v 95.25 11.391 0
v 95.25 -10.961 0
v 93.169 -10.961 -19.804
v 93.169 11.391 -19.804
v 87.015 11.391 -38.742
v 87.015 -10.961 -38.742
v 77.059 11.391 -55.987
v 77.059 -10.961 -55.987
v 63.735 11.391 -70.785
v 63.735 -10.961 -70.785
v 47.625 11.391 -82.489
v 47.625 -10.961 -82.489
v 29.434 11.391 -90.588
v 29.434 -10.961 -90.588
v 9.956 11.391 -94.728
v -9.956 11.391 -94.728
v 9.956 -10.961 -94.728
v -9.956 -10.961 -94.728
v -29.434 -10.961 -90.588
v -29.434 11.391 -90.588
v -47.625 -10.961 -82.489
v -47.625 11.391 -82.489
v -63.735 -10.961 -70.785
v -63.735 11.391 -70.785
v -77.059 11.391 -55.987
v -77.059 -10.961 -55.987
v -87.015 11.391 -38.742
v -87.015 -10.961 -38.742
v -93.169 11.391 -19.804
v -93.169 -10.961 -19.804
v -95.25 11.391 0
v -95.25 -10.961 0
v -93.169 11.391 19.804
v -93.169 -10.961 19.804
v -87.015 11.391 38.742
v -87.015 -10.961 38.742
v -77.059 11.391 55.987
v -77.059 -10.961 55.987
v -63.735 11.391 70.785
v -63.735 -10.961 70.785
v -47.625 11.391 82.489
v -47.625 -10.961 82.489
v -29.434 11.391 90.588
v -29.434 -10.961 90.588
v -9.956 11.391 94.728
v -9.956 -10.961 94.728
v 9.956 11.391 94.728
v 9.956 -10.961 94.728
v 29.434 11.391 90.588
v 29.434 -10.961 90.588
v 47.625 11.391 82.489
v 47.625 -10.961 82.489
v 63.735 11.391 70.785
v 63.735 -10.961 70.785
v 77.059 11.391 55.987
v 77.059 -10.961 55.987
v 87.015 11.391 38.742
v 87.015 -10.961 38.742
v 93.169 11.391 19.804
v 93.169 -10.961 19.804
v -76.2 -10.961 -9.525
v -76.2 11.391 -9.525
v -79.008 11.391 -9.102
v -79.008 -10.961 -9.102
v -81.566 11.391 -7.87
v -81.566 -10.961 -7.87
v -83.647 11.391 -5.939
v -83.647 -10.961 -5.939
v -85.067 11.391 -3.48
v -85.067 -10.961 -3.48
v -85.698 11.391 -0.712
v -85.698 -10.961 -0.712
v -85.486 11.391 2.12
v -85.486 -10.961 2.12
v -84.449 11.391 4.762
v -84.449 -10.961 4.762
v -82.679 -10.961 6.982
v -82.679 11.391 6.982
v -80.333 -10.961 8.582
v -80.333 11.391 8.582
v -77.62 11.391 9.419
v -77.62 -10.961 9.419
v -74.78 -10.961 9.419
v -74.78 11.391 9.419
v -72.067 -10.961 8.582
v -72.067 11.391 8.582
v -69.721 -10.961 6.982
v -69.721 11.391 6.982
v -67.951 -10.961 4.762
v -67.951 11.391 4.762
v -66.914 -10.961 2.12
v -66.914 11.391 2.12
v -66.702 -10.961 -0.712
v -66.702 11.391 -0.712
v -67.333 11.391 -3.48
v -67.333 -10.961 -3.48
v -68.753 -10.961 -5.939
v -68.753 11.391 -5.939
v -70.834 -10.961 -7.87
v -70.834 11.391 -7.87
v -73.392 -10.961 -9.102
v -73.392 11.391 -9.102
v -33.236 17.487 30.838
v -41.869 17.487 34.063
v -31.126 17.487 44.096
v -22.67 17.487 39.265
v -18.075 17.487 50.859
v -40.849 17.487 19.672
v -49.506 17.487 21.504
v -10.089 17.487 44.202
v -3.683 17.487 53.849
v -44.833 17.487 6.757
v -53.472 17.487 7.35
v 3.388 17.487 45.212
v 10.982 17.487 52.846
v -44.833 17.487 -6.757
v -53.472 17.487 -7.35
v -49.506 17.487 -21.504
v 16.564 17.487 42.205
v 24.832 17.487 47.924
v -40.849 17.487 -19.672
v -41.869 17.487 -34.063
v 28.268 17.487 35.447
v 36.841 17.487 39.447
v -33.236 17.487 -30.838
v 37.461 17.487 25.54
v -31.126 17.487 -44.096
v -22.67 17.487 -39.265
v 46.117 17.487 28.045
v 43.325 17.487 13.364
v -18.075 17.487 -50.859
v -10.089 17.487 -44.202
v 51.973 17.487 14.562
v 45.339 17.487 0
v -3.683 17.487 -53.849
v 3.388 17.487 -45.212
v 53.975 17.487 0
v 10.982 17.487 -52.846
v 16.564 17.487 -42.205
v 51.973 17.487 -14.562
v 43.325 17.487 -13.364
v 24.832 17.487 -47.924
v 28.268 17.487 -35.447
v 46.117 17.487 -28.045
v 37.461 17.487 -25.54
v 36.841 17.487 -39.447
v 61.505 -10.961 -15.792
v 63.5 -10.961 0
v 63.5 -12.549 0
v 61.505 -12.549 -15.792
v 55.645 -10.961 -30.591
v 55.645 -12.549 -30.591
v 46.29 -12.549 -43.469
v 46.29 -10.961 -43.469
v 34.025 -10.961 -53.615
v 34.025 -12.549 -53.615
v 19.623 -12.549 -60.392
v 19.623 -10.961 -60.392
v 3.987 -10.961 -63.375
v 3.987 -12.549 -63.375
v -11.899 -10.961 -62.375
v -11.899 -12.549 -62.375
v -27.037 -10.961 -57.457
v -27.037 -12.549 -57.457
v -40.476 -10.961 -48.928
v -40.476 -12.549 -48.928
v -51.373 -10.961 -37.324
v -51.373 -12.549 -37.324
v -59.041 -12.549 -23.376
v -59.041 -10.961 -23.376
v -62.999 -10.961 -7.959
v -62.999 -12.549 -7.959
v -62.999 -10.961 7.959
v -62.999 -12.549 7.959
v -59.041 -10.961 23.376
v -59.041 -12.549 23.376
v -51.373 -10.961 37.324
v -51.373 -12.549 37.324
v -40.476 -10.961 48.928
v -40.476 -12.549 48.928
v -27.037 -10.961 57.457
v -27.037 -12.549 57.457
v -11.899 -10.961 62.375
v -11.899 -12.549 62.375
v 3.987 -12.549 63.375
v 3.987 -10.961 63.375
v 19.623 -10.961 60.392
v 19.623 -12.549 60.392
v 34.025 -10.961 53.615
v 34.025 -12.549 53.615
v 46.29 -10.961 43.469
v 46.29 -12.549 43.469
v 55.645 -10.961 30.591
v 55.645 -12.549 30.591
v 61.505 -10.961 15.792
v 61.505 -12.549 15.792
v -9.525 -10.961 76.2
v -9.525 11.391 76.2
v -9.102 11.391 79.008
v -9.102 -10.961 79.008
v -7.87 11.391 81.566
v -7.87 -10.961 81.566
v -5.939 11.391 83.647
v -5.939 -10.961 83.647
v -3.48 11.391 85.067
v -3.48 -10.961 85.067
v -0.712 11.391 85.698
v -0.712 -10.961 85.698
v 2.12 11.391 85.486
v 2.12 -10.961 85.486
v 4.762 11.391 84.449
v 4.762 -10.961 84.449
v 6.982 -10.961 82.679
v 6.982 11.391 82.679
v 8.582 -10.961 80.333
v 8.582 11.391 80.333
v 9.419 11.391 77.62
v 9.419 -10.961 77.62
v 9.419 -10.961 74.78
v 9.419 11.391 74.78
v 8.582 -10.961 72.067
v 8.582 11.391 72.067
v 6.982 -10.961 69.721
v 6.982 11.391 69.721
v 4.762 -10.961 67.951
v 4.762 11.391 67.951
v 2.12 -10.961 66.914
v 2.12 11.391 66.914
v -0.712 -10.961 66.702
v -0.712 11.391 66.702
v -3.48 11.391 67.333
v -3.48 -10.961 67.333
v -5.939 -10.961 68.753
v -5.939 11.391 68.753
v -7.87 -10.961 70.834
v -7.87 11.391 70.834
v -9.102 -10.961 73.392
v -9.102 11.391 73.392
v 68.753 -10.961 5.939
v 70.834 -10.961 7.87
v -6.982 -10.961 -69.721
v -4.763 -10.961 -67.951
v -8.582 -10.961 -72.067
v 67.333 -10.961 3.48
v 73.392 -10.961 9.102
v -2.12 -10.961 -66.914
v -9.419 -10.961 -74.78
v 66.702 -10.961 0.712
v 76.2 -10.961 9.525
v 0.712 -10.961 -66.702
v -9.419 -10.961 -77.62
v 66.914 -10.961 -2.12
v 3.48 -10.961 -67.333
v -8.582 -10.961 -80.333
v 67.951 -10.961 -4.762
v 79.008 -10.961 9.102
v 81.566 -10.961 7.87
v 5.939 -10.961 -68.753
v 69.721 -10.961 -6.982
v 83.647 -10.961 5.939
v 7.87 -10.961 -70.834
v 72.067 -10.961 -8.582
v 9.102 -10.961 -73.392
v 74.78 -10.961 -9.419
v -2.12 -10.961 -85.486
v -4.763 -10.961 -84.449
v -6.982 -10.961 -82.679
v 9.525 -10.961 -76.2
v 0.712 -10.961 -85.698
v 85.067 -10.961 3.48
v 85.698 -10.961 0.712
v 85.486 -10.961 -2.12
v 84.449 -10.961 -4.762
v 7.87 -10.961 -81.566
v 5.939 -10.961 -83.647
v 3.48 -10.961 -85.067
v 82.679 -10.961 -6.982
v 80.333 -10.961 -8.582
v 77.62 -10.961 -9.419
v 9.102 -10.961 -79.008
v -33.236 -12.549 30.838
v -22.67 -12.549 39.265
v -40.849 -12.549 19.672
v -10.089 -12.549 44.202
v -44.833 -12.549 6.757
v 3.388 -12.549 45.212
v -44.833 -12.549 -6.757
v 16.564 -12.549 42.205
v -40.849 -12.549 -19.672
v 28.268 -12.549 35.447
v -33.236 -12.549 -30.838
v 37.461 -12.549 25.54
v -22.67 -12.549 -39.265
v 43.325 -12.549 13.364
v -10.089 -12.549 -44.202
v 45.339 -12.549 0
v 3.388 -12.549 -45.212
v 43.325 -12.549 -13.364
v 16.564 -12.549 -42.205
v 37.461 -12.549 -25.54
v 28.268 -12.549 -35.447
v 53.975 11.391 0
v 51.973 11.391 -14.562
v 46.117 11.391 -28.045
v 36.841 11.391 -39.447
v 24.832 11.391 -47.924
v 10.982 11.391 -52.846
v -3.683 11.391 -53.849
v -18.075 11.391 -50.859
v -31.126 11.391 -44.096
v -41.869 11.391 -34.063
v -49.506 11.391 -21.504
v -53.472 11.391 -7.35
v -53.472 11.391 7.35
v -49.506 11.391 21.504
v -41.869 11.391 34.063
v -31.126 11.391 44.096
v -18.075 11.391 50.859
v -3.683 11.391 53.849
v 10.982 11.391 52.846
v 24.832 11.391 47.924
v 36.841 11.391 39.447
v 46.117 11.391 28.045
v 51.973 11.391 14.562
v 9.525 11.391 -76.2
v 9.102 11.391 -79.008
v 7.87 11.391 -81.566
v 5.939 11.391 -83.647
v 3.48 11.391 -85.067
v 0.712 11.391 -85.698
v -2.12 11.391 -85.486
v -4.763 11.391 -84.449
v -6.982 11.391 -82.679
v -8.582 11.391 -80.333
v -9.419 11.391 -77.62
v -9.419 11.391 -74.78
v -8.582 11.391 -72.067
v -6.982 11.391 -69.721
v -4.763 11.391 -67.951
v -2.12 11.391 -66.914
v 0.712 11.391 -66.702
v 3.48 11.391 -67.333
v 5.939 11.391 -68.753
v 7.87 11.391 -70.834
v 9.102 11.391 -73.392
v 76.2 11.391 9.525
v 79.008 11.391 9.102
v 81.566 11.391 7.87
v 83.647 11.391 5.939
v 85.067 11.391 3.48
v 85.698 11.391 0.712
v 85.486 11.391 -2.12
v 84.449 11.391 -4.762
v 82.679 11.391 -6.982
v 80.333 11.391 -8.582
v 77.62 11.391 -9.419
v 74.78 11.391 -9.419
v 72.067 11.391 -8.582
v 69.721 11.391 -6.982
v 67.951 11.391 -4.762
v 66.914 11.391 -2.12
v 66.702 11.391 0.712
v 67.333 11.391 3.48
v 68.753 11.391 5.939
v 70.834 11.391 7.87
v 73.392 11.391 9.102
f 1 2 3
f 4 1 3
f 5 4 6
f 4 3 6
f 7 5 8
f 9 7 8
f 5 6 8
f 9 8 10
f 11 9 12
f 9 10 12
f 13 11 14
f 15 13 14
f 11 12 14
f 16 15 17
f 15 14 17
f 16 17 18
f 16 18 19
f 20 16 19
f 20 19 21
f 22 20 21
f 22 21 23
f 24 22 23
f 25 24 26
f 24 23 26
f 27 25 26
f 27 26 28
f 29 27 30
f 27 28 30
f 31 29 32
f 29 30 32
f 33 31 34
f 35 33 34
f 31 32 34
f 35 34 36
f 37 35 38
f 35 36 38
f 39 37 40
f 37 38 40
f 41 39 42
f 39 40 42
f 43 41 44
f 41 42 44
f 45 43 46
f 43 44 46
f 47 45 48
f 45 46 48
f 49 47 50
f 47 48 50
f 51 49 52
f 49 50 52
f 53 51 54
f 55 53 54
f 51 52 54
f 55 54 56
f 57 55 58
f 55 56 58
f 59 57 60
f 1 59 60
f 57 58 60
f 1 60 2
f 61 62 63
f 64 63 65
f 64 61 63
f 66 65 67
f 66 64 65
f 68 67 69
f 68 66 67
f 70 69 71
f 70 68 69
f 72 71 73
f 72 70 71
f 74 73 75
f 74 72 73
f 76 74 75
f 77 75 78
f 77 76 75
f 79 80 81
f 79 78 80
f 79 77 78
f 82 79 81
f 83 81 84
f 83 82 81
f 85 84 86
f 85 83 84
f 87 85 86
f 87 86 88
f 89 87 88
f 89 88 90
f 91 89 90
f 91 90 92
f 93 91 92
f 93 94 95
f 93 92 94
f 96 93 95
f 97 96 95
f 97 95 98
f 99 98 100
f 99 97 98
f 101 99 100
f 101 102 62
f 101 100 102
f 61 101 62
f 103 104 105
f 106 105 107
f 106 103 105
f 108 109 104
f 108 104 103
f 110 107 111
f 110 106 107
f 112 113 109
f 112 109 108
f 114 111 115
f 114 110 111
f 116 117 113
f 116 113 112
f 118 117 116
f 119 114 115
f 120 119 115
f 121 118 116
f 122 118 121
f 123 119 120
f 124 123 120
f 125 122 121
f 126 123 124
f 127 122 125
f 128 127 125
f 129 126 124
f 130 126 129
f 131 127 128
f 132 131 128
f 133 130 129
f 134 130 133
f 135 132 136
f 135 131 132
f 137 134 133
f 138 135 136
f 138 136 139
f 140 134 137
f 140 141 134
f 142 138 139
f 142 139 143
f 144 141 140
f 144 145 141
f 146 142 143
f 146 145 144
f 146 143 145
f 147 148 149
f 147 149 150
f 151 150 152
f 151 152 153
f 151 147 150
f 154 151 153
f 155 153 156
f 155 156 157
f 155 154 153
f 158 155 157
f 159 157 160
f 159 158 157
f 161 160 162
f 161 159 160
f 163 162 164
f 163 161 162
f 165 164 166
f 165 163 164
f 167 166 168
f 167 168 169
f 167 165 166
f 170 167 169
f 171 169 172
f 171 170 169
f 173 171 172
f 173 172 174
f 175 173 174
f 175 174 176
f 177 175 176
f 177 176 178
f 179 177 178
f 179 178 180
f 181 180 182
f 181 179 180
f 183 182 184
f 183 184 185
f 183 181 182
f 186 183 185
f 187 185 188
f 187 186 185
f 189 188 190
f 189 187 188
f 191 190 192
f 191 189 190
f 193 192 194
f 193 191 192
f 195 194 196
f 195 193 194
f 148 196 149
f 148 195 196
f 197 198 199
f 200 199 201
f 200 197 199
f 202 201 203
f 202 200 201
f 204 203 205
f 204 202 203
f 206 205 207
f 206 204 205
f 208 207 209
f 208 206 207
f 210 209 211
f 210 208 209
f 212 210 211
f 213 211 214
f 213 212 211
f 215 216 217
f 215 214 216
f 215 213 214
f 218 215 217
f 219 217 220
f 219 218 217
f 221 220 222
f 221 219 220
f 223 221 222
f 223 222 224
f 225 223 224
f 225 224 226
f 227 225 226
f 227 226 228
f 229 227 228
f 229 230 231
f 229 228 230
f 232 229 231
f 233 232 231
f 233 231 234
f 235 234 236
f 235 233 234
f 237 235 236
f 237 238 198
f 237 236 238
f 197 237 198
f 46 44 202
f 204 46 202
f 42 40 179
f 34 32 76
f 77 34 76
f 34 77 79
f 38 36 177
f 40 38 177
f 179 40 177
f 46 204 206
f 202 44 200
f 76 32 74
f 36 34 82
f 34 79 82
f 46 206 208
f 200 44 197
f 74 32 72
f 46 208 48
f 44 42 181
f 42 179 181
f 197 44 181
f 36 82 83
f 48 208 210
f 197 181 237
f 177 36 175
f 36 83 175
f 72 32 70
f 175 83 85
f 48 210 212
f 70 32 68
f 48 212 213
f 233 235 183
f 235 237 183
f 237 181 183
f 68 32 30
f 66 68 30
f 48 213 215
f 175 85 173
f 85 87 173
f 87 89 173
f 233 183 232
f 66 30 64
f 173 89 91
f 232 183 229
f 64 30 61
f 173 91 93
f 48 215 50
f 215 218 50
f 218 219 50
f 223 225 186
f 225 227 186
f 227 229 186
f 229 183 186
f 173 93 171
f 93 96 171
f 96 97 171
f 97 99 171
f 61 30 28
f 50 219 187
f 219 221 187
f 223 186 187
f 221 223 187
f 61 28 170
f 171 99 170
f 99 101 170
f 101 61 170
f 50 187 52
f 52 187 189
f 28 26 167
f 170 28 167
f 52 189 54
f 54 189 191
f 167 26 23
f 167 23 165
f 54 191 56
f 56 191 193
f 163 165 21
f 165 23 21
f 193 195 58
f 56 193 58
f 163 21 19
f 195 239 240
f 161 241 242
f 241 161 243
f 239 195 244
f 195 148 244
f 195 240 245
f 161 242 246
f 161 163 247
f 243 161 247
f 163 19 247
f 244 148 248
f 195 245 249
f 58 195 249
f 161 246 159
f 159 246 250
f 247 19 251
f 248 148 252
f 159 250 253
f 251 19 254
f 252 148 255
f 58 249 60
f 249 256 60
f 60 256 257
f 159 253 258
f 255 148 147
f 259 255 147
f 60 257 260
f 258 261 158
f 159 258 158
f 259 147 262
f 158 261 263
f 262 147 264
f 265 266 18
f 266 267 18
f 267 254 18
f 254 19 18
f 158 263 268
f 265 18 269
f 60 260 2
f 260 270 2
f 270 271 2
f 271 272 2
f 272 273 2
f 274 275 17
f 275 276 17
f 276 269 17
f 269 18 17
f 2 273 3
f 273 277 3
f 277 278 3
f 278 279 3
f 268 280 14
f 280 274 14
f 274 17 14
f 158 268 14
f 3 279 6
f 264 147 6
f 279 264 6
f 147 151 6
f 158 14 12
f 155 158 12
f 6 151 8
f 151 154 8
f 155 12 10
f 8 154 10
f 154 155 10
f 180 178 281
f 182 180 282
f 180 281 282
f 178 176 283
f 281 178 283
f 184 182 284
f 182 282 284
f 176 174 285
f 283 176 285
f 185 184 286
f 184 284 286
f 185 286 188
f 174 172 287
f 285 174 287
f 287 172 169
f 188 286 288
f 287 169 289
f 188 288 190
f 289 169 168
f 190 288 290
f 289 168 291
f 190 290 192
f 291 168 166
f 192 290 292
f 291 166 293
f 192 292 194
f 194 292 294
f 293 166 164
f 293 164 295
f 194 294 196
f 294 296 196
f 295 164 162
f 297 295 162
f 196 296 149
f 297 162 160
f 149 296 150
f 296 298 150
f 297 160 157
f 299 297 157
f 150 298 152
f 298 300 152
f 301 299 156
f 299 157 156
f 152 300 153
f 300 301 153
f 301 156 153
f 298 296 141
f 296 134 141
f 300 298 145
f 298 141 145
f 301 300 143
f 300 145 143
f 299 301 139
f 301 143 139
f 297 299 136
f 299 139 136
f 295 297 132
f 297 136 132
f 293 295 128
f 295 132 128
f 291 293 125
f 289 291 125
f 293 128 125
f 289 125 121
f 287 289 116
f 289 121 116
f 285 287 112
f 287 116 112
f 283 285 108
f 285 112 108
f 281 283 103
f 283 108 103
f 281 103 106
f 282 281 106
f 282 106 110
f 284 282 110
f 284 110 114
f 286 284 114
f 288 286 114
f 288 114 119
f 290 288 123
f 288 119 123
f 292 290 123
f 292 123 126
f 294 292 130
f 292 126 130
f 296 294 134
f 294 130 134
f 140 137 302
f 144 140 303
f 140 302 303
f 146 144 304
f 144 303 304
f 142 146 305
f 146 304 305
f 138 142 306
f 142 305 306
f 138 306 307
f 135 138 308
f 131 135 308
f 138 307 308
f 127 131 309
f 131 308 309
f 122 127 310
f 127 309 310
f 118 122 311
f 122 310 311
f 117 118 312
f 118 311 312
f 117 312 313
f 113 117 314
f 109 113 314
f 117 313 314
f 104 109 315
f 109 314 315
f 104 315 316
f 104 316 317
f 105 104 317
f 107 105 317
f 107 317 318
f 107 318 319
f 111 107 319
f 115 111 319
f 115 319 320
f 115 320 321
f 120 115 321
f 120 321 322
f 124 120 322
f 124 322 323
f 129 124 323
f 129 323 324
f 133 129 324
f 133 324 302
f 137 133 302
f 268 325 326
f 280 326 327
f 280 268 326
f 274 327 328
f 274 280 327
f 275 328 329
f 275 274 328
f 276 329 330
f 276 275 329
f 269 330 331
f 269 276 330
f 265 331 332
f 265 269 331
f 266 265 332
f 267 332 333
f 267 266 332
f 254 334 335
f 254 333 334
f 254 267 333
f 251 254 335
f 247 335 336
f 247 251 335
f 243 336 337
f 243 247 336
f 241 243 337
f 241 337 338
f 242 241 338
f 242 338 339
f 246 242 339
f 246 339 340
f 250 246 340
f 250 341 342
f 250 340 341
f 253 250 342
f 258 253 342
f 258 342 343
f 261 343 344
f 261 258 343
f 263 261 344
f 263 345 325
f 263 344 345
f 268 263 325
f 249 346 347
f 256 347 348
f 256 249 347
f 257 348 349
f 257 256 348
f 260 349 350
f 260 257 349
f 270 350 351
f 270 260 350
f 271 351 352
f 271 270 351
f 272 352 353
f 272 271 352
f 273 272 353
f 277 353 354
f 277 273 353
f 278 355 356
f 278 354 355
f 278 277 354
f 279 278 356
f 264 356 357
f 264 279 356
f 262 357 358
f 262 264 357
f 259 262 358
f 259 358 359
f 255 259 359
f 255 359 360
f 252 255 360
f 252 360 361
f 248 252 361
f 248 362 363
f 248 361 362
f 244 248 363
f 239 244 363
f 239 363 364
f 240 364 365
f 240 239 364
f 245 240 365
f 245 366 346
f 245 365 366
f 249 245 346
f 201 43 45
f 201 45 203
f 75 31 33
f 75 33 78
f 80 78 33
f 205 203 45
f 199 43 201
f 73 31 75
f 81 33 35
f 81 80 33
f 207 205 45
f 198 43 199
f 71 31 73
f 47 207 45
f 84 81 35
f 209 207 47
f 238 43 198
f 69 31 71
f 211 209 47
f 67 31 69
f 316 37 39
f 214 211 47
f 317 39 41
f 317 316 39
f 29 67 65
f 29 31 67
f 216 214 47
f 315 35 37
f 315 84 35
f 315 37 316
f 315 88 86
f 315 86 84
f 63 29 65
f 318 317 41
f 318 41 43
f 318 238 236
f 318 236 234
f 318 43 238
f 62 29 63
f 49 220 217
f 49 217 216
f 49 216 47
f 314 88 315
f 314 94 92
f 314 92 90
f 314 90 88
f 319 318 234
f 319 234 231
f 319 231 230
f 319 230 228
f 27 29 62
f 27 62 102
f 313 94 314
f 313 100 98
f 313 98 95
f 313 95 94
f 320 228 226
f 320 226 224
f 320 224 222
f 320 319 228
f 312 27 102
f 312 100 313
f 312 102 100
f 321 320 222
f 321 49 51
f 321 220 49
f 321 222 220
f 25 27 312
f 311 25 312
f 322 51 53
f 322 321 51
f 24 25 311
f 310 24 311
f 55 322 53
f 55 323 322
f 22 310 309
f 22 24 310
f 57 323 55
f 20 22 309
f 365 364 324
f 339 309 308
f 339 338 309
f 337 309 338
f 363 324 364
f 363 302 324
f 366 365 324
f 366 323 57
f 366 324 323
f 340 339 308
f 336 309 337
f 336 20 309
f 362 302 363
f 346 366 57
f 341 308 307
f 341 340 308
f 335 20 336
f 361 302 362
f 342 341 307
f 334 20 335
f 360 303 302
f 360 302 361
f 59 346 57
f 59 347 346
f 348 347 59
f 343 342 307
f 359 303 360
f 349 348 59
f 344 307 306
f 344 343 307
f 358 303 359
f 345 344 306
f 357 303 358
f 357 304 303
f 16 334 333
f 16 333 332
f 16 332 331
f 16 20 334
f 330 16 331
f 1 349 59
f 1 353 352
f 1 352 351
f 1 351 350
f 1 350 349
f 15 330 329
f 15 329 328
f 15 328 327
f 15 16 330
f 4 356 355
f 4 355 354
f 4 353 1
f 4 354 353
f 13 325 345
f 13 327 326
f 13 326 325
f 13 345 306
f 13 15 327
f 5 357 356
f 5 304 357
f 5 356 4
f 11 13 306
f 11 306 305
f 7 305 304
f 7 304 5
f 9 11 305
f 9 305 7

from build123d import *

# Parameters (mm, degrees)
SKETCH1_R               = 3.75
BOSS_EXTRUDE1_DEPTH     = 0.88
SKETCH2_R               = 2.125
BOSS_EXTRUDE2_DEPTH     = 1.12
SKETCH3_R               = 2.5
BOSS_EXTRUDE3_DEPTH     = 0.0625
SKETCH4_R               = 1.785
CUT_EXTRUDE1_DEPTH      = 3
CUT_EXTRUDE1_DEPTH_BACK = 1.0625
SKETCH7_R               = 0.375
CUT_EXTRUDE2_DEPTH      = 3.0625
CIRPATTERN1_COUNT       = 4
SCALE1_SCALE            = 25.4


with BuildPart() as part:
    # Sketch1 → Boss-Extrude1 (new body)
    with BuildSketch(Plane(origin=(0, 0, 0), x_dir=(1, 0, 0), z_dir=(0, 1, 0))):
        Circle(SKETCH1_R)
    extrude(amount=BOSS_EXTRUDE1_DEPTH)

    # Sketch2 → Boss-Extrude2 (add)
    with BuildSketch(Plane(origin=(0, 0, 0), x_dir=(1, 0, 0), z_dir=(0, 1, 0))):
        Circle(SKETCH2_R)
    extrude(amount=BOSS_EXTRUDE2_DEPTH)

    # Sketch3 → Boss-Extrude3 (add)
    with BuildSketch(Plane(origin=(0, 0, 0), x_dir=(1, 0, 0), z_dir=(0, 1, 0))):
        Circle(SKETCH3_R)
    extrude(amount=-BOSS_EXTRUDE3_DEPTH)

    # Sketch4 → Cut-Extrude1 (cut, two sides)
    with BuildSketch(Plane(origin=(0, 0, 0), x_dir=(1, 0, 0), z_dir=(0, 1, 0))) as cut_extrude1_sk:
        Circle(SKETCH4_R)
    extrude(amount=CUT_EXTRUDE1_DEPTH, mode=Mode.SUBTRACT)
    extrude(cut_extrude1_sk.sketch, amount=-CUT_EXTRUDE1_DEPTH_BACK, mode=Mode.SUBTRACT)

    # Sketch7 → Cut-Extrude2 (cut)
    with BuildSketch(Plane(origin=(0, 0, 0), x_dir=(1, 0, 0), z_dir=(0, 1, 0))):
        with Locations((0, 3)):
            Circle(SKETCH7_R)
    cut_extrude2 = extrude(amount=CUT_EXTRUDE2_DEPTH, mode=Mode.SUBTRACT)

    # CirPattern1: Cut-Extrude2 ×4 about axis
    cirpattern1_axis = Axis((0, 0, 0), (0, 1, 0))
    for i in range(1, CIRPATTERN1_COUNT):
        add(cut_extrude2.rotate(cirpattern1_axis, i * 360 / CIRPATTERN1_COUNT), mode=Mode.SUBTRACT)


with BuildPart() as part_1:
    # Scale1: scaled about (0, 0.449224649, 0)
    add(part.part.scale(SCALE1_SCALE).moved(Location((0, -10.961081436, 0))))


solid = part_1.part
